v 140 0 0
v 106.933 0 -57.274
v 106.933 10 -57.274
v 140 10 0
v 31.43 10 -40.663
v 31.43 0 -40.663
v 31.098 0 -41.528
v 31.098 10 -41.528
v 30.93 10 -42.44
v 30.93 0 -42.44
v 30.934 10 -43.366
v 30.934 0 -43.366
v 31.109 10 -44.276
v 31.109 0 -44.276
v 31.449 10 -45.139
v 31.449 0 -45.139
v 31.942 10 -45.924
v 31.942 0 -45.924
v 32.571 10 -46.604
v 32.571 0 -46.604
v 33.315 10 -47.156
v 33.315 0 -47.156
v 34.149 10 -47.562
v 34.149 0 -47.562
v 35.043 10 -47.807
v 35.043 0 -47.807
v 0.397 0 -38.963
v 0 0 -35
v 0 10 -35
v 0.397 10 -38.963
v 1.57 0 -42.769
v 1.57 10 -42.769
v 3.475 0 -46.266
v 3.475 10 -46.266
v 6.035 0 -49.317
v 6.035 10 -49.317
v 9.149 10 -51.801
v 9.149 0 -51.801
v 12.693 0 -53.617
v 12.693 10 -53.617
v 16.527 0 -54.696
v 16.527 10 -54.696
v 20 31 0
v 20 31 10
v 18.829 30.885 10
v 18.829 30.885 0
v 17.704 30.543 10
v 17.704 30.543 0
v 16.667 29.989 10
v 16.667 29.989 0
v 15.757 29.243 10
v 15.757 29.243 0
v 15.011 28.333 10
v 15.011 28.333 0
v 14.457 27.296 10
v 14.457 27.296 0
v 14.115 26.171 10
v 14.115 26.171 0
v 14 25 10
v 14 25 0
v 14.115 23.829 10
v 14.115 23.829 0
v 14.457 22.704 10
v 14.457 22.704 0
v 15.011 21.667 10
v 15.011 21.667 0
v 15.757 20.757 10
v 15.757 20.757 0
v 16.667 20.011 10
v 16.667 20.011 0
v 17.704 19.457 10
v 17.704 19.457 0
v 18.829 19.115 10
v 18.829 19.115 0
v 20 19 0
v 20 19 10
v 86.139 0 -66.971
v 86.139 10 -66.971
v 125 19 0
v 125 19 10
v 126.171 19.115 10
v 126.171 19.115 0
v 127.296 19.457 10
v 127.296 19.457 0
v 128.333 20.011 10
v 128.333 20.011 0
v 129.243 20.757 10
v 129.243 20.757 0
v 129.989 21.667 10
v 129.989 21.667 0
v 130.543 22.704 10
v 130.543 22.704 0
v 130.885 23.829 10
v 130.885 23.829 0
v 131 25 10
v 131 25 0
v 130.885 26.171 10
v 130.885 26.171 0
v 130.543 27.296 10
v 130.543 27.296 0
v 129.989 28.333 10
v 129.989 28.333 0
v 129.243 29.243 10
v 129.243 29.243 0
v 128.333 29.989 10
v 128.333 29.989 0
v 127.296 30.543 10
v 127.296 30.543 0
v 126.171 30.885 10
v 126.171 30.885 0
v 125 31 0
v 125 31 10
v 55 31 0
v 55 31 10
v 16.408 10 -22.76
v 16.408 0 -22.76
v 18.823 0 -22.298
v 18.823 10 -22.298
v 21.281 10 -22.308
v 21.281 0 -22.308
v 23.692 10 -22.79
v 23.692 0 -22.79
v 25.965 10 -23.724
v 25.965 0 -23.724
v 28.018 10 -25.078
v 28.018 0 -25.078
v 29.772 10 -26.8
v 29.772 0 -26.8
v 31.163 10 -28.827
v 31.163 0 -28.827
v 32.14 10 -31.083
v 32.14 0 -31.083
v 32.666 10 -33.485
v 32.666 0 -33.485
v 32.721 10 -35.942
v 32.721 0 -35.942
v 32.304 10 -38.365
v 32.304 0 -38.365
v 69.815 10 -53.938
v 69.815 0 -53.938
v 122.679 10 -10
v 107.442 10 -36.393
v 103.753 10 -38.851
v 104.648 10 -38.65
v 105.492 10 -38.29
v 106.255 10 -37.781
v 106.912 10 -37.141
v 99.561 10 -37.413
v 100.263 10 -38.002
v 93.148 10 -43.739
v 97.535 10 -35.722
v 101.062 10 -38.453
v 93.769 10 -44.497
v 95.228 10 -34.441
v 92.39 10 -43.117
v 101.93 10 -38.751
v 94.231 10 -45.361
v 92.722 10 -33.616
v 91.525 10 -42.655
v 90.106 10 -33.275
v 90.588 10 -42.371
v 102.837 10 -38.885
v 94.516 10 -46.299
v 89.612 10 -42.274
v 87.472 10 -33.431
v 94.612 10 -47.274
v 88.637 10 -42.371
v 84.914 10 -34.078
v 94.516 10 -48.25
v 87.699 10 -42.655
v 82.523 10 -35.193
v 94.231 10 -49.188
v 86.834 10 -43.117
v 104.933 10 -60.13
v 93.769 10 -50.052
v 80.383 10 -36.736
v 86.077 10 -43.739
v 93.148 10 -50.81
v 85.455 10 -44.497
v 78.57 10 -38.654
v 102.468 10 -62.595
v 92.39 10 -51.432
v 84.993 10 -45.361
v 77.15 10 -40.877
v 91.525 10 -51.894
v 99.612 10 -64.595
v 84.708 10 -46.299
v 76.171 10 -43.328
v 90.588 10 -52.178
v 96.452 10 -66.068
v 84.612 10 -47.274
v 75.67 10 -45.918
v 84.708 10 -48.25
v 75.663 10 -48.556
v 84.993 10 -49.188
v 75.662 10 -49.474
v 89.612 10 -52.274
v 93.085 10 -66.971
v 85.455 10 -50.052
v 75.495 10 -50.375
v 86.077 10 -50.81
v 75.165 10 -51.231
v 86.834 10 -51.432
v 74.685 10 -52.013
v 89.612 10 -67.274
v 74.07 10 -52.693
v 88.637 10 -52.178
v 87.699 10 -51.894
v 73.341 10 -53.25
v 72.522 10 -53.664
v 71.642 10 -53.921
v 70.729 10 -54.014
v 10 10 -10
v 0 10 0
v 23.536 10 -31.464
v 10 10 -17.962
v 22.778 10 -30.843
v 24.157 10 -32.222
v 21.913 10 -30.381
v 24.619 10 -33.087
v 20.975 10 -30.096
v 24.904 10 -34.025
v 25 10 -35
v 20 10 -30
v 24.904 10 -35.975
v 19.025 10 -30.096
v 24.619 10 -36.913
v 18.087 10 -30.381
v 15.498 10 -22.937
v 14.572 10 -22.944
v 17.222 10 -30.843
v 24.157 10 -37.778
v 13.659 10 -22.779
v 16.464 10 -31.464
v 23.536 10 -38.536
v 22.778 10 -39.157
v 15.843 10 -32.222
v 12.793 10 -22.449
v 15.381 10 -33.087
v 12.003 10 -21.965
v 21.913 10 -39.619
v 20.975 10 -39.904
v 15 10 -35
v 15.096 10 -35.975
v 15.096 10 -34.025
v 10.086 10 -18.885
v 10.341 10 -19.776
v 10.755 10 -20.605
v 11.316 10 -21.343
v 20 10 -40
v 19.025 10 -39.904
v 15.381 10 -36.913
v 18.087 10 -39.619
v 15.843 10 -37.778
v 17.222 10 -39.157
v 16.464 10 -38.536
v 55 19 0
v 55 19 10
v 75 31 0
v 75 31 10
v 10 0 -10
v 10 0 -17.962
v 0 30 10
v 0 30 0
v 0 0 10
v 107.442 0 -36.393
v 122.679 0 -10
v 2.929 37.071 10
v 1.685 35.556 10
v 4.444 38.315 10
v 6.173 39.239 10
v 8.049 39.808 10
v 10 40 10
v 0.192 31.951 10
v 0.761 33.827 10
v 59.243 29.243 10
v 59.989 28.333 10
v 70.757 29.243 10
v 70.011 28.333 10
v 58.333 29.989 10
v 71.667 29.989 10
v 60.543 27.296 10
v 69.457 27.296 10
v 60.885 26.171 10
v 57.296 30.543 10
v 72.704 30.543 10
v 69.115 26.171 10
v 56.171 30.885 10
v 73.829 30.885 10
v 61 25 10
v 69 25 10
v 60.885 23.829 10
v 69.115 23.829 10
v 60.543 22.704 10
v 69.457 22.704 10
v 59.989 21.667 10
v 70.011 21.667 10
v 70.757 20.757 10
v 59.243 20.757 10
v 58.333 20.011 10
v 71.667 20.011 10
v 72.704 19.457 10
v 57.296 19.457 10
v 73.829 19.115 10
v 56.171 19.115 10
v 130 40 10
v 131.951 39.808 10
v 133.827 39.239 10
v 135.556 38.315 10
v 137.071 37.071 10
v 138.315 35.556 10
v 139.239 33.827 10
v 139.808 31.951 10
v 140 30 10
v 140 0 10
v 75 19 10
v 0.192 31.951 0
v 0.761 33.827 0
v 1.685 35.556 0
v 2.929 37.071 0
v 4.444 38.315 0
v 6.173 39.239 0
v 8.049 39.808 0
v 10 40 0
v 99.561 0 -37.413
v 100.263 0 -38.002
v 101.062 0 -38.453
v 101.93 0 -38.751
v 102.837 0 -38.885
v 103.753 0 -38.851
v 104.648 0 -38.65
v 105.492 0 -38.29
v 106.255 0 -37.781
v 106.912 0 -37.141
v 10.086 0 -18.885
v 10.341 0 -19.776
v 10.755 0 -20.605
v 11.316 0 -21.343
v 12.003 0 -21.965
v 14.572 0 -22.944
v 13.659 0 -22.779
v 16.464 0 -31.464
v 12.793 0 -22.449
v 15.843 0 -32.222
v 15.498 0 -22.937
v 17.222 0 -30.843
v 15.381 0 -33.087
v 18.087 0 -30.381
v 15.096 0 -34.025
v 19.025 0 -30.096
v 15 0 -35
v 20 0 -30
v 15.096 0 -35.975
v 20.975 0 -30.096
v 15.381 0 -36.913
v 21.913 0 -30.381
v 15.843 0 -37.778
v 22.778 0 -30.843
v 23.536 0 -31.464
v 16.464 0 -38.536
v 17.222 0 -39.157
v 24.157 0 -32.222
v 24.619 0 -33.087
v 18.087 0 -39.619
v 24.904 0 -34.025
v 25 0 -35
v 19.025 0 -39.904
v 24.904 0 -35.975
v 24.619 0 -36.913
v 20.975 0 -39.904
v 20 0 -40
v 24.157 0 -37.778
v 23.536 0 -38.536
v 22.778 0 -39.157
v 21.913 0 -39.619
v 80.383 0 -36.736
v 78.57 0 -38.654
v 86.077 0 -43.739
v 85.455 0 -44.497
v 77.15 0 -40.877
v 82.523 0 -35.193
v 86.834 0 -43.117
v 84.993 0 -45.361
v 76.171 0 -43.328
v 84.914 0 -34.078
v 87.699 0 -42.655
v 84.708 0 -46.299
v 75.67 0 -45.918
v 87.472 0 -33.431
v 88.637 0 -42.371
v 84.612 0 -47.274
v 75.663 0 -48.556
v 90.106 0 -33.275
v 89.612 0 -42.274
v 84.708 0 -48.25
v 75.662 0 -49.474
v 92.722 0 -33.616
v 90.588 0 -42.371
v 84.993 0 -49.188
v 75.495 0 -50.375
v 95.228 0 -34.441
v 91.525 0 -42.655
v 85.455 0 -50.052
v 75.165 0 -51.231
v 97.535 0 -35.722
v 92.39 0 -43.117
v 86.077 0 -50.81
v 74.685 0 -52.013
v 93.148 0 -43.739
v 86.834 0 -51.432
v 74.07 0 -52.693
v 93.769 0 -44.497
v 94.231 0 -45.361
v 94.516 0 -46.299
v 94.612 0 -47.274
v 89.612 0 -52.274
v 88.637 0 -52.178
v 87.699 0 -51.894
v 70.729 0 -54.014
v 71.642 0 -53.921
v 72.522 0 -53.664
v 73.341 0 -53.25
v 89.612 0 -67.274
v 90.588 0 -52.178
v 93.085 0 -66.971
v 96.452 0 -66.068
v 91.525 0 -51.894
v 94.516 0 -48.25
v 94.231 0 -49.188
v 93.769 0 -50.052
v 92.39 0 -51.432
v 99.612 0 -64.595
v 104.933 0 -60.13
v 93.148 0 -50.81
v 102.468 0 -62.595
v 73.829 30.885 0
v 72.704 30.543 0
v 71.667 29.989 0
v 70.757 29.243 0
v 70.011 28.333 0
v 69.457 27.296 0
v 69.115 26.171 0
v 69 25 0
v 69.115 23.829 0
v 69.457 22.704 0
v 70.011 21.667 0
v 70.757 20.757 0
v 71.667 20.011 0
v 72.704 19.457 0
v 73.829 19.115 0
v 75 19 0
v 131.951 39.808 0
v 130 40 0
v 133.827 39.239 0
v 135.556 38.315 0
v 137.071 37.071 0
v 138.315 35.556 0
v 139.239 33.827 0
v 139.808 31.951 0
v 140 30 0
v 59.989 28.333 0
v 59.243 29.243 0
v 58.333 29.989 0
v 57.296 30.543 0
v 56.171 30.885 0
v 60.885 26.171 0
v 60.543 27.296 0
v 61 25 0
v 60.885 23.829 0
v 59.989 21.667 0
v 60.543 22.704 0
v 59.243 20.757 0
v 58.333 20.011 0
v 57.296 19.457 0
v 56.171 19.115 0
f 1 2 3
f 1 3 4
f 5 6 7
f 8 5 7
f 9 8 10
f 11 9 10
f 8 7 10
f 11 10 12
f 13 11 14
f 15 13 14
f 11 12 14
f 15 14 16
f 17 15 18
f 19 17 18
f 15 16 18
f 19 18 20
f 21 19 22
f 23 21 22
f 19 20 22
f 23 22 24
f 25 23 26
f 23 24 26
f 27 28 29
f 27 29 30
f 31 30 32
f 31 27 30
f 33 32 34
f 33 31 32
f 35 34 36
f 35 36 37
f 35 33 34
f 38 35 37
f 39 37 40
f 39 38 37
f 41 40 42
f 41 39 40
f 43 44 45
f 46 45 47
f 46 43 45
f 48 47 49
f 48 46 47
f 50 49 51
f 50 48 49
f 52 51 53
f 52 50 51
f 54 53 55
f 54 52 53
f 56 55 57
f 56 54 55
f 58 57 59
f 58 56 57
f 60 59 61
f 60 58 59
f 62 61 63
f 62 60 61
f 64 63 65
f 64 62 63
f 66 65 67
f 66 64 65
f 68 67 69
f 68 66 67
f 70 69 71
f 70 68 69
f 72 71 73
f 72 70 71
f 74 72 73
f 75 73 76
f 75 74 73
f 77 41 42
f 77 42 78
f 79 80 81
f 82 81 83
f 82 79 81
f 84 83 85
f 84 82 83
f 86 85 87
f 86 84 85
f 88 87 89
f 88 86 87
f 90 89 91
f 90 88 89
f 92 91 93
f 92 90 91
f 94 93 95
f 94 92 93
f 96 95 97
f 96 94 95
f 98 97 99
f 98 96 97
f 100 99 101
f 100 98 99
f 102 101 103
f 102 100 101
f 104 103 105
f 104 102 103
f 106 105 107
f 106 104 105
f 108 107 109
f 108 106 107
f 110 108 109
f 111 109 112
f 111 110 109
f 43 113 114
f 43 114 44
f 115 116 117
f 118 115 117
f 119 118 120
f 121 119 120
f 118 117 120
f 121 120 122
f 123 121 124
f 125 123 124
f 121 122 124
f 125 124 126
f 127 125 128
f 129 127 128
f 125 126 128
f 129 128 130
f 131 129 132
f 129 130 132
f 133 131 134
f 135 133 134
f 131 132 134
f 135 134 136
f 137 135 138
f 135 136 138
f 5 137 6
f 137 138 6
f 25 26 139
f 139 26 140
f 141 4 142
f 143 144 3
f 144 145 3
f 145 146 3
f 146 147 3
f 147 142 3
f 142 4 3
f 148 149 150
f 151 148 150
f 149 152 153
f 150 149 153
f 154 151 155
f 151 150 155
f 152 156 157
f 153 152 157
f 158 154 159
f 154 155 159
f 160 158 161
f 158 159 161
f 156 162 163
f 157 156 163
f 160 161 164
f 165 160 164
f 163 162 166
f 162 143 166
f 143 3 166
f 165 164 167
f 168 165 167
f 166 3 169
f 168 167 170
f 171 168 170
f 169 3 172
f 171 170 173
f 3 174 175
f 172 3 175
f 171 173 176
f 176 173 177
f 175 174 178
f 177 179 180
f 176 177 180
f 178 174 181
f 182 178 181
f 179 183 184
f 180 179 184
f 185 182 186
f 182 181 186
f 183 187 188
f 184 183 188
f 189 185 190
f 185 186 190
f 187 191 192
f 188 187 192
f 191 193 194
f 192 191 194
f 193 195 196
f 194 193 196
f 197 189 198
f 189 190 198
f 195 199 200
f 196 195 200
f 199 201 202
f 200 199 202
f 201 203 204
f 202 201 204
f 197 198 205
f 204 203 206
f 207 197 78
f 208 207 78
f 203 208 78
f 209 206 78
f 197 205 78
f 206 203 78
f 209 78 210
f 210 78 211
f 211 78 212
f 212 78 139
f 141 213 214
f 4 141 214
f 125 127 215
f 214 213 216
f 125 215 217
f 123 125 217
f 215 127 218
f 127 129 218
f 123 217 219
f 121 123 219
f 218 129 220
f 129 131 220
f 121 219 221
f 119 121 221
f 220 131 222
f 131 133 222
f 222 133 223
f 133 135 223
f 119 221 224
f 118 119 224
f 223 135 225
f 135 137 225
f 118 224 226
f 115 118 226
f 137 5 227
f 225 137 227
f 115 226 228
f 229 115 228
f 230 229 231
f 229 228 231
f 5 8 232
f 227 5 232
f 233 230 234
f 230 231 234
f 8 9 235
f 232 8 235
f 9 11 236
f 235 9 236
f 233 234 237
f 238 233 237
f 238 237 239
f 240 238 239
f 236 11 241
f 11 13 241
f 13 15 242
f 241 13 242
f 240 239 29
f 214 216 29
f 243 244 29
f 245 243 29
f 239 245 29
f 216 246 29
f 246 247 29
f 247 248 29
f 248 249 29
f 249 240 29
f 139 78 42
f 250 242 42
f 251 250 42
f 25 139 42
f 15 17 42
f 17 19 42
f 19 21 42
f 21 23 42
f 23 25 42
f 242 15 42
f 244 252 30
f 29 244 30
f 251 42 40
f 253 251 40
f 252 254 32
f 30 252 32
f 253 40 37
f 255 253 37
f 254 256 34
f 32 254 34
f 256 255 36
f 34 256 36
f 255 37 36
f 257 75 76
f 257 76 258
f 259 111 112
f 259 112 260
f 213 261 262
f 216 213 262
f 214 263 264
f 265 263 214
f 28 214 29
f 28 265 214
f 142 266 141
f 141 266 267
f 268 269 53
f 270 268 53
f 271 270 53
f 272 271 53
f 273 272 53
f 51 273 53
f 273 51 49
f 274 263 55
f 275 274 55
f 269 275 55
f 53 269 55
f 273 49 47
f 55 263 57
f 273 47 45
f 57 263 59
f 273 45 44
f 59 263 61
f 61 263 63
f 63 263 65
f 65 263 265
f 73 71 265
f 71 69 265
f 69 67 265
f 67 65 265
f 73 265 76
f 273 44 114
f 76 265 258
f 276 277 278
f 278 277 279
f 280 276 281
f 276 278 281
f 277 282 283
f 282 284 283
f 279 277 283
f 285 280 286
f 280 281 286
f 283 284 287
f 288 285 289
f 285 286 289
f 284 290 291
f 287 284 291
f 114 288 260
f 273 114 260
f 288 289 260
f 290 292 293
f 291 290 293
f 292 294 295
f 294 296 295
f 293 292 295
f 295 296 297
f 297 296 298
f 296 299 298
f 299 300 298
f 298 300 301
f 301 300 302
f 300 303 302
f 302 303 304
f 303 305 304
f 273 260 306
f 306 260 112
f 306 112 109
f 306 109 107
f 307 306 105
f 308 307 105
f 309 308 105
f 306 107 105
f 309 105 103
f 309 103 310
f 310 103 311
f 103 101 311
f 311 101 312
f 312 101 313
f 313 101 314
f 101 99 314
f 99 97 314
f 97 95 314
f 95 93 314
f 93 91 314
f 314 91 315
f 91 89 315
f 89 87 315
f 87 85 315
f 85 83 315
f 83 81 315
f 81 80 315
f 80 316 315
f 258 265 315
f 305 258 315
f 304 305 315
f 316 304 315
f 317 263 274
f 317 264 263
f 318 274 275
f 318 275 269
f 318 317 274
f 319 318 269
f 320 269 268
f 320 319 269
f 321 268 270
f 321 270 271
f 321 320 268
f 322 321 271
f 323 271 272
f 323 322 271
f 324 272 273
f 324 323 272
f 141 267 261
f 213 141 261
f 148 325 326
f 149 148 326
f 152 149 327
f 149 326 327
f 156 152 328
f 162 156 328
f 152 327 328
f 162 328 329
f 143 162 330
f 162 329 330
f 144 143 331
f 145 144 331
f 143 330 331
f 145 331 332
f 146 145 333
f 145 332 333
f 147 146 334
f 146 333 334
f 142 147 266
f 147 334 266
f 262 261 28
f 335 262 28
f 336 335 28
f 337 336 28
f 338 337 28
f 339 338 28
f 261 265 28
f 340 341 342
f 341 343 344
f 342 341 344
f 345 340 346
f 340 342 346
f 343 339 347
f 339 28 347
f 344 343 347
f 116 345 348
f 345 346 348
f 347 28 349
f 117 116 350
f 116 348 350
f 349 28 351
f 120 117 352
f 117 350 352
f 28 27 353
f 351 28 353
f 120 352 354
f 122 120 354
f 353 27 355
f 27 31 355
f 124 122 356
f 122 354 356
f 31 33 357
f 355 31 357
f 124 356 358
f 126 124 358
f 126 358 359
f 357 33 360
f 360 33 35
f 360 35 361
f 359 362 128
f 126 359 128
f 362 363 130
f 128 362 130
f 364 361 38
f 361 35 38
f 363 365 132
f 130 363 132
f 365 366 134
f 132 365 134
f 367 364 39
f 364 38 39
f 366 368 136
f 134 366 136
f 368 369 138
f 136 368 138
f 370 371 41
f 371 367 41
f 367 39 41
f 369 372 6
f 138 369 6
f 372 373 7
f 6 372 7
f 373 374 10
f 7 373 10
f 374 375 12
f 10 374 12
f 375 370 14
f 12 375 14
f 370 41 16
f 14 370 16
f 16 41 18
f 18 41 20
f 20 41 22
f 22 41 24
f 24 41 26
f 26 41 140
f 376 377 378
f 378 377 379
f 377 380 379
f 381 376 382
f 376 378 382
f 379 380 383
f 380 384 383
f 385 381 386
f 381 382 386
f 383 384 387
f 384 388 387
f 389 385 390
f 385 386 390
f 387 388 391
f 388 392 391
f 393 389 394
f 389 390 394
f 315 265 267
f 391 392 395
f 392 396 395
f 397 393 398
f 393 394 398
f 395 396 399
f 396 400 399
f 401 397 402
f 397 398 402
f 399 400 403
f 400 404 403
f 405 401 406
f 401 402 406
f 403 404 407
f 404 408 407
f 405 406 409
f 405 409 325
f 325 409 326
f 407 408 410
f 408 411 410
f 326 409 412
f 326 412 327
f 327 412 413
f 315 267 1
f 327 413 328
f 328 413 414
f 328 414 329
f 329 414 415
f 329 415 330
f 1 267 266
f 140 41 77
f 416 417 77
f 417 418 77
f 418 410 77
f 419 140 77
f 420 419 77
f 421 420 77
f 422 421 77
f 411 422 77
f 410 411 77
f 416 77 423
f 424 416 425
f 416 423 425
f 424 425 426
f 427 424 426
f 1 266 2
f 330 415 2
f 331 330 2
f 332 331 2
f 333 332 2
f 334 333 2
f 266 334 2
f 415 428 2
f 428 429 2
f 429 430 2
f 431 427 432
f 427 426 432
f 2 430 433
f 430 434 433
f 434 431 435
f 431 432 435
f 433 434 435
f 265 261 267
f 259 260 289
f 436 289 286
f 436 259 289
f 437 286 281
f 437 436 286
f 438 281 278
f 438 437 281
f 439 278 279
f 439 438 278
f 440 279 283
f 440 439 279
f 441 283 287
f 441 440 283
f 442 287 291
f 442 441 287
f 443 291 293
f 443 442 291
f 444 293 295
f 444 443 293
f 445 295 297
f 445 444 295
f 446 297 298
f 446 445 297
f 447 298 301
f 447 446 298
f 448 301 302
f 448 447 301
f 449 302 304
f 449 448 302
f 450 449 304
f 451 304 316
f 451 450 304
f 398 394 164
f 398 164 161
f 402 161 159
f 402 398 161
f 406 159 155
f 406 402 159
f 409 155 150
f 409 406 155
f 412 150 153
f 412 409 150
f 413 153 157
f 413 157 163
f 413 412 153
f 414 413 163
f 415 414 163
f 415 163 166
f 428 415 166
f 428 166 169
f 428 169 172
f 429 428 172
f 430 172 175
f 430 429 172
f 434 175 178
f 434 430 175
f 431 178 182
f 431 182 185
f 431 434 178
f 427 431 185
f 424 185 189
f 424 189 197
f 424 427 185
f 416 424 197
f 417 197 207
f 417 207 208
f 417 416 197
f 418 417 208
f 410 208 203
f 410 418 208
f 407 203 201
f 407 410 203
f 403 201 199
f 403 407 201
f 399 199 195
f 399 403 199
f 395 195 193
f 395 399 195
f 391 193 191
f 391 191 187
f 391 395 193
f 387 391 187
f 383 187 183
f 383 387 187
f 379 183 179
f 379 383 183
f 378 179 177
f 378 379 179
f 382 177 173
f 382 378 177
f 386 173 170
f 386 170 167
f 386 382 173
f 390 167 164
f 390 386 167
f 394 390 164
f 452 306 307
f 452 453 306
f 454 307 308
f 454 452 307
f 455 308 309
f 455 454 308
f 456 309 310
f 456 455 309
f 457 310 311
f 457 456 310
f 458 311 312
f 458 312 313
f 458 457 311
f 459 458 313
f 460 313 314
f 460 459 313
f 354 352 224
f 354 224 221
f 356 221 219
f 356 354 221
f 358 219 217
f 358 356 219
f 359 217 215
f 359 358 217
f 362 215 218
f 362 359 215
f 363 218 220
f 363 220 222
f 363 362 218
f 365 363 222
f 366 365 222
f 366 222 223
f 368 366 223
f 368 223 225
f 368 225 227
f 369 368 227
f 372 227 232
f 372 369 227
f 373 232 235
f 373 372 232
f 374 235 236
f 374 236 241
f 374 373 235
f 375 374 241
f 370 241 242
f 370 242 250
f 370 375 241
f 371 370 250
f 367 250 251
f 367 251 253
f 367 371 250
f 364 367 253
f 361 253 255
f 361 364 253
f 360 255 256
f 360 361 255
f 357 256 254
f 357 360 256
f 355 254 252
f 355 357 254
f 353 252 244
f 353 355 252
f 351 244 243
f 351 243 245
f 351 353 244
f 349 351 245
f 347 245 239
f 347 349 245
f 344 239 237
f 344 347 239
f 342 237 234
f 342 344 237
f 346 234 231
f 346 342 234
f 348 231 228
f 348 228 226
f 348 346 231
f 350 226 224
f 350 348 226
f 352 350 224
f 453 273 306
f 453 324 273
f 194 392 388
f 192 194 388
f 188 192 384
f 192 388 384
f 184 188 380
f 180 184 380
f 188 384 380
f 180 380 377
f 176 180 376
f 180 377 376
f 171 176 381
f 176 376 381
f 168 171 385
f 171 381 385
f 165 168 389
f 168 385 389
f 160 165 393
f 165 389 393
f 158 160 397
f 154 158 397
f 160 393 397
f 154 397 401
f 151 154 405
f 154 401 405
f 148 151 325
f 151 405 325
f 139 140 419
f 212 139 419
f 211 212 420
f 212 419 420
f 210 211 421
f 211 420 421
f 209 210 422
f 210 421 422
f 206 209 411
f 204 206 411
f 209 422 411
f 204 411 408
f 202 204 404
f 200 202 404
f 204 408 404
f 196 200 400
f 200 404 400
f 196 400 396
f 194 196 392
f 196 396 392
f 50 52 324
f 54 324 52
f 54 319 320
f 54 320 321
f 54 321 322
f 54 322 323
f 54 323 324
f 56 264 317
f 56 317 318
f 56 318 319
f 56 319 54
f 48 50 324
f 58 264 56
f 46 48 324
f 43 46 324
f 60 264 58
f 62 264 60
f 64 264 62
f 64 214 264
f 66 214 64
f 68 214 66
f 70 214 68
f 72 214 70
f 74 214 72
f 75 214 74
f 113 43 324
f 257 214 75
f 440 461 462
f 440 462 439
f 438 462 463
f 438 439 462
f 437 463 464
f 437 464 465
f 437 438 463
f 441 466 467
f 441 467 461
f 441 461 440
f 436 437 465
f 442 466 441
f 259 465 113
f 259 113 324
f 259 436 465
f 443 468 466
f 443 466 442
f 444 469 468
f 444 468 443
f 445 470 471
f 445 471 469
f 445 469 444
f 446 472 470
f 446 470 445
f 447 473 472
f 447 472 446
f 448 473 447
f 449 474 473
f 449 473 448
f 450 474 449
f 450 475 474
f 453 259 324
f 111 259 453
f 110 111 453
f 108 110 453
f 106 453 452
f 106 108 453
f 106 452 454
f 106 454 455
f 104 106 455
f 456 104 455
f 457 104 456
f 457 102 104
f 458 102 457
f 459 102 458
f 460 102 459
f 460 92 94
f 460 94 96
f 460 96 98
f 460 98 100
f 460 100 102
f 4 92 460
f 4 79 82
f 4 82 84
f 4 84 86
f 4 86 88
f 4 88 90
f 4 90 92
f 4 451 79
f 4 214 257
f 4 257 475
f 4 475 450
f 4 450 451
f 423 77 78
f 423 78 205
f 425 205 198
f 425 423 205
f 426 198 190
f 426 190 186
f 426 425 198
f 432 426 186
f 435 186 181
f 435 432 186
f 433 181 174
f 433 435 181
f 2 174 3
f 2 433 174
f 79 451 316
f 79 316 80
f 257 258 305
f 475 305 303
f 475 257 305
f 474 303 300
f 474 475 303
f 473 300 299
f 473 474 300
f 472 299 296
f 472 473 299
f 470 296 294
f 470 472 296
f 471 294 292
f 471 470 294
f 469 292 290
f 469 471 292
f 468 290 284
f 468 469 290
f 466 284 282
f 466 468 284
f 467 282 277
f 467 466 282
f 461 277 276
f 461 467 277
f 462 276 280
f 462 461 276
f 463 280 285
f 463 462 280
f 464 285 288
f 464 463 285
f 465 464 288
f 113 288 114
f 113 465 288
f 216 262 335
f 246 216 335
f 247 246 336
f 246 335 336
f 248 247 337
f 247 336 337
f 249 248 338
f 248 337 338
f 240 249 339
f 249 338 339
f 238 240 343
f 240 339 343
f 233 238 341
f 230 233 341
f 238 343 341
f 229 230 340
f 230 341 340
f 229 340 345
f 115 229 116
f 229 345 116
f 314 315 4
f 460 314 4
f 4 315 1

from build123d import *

# Parameters (mm, degrees)
SKETCH1_R                = 5
BOSS_EXTRUDE1_DEPTH      = 10
BOSS_EXTRUDE2_DEPTH      = 30
BOSS_EXTRUDE2_DEPTH_BACK = 10
SKETCH2_W                = 140
SKETCH2_H                = 10
CUT_EXTRUDE1_DEPTH       = 30
FILLET1_R                = 10


with BuildPart() as part:
    # Sketch1 → Boss-Extrude1 (new body)
    with BuildSketch(Plane(origin=(0, 0, 0), x_dir=(1, 0, 0), z_dir=(0, 1, 0))):
        with BuildLine():
            Line((0, 0), (0, 35))
            ThreePointArc((0, 35), (4.679111138, 47.855752194), (16.527036447, 54.69615506))
            Line((16.527036447, 54.69615506), (86.139090058, 66.970638294))
            ThreePointArc((86.139090058, 66.970638294), (98.064418846, 65.400638975), (106.932561687, 57.274483234))
            Line((106.932561687, 57.274483234), (140, 0))
            Line((140, 0), (0, 0))
        make_face()
        with Locations(Location((20, 35, 0), (0, 0, 270))):
            Circle(SKETCH1_R, mode=Mode.SUBTRACT)
        with Locations(Location((89.612053611, 47.274483234, 0), (0, 0, 270))):
            Circle(SKETCH1_R, mode=Mode.SUBTRACT)
        with BuildLine():
            Line((122.679491924, 10), (10, 10))
            Line((10, 10), (10, 17.962162855))
            ThreePointArc((10, 17.962162855), (12.003313152, 21.964645576), (16.407947174, 22.759837787))
            ThreePointArc((16.407947174, 22.759837787), (29.771929506, 26.800377555), (31.430453218, 40.662963335))
            ThreePointArc((31.430453218, 40.662963335), (31.448708001, 45.138764747), (35.042512339, 47.806666902))
            Line((35.042512339, 47.806666902), (69.815261378, 53.938040751))
            ThreePointArc((69.815261378, 53.938040751), (74.069509797, 52.692990027), (75.66252141, 48.556434103))
            ThreePointArc((75.66252141, 48.556434103), (83.691884517, 34.57863964), (99.560671411, 37.412543742))
            ThreePointArc((99.560671411, 37.412543742), (103.753425217, 38.851152942), (107.441767577, 36.39251276))
            Line((107.441767577, 36.39251276), (122.679491924, 10))
        make_face(mode=Mode.SUBTRACT)
    extrude(amount=BOSS_EXTRUDE1_DEPTH)

    # Sketch2 → Boss-Extrude2 (add, two sides: drawn at the far end of the back side and taken through both)
    with BuildSketch(Plane(origin=(0, 10, 0), x_dir=(1, 0, 0), z_dir=(0, 1, 0)).offset(-BOSS_EXTRUDE2_DEPTH_BACK)):
        with Locations((70, -5)):
            Rectangle(SKETCH2_W, SKETCH2_H)
    extrude(amount=BOSS_EXTRUDE2_DEPTH + BOSS_EXTRUDE2_DEPTH_BACK)

    # Sketch3 → Cut-Extrude1 (cut)
    with BuildSketch(Plane(origin=(0, 0, 0), x_dir=(-1, 0, 0), z_dir=(0, 0, -1))):
        with BuildLine():
            Line((-125, 31), (-75, 31))
            ThreePointArc((-75, 31), (-69, 25), (-75, 19))
            Line((-75, 19), (-125, 19))
            ThreePointArc((-125, 19), (-131, 25), (-125, 31))
        make_face()
        with BuildLine():
            Line((-55, 31), (-20, 31))
            ThreePointArc((-20, 31), (-14, 25), (-20, 19))
            Line((-20, 19), (-55, 19))
            ThreePointArc((-55, 19), (-61, 25), (-55, 31))
        make_face()
    extrude(amount=-CUT_EXTRUDE1_DEPTH, mode=Mode.SUBTRACT)

    # Fillet1
    fillet1_edges = [part.edges().sort_by_distance(p)[0] for p in [
        (0, 40, 5),
        (140, 40, 5),
    ]]
    fillet(fillet1_edges, radius=FILLET1_R)


solid = part.part
